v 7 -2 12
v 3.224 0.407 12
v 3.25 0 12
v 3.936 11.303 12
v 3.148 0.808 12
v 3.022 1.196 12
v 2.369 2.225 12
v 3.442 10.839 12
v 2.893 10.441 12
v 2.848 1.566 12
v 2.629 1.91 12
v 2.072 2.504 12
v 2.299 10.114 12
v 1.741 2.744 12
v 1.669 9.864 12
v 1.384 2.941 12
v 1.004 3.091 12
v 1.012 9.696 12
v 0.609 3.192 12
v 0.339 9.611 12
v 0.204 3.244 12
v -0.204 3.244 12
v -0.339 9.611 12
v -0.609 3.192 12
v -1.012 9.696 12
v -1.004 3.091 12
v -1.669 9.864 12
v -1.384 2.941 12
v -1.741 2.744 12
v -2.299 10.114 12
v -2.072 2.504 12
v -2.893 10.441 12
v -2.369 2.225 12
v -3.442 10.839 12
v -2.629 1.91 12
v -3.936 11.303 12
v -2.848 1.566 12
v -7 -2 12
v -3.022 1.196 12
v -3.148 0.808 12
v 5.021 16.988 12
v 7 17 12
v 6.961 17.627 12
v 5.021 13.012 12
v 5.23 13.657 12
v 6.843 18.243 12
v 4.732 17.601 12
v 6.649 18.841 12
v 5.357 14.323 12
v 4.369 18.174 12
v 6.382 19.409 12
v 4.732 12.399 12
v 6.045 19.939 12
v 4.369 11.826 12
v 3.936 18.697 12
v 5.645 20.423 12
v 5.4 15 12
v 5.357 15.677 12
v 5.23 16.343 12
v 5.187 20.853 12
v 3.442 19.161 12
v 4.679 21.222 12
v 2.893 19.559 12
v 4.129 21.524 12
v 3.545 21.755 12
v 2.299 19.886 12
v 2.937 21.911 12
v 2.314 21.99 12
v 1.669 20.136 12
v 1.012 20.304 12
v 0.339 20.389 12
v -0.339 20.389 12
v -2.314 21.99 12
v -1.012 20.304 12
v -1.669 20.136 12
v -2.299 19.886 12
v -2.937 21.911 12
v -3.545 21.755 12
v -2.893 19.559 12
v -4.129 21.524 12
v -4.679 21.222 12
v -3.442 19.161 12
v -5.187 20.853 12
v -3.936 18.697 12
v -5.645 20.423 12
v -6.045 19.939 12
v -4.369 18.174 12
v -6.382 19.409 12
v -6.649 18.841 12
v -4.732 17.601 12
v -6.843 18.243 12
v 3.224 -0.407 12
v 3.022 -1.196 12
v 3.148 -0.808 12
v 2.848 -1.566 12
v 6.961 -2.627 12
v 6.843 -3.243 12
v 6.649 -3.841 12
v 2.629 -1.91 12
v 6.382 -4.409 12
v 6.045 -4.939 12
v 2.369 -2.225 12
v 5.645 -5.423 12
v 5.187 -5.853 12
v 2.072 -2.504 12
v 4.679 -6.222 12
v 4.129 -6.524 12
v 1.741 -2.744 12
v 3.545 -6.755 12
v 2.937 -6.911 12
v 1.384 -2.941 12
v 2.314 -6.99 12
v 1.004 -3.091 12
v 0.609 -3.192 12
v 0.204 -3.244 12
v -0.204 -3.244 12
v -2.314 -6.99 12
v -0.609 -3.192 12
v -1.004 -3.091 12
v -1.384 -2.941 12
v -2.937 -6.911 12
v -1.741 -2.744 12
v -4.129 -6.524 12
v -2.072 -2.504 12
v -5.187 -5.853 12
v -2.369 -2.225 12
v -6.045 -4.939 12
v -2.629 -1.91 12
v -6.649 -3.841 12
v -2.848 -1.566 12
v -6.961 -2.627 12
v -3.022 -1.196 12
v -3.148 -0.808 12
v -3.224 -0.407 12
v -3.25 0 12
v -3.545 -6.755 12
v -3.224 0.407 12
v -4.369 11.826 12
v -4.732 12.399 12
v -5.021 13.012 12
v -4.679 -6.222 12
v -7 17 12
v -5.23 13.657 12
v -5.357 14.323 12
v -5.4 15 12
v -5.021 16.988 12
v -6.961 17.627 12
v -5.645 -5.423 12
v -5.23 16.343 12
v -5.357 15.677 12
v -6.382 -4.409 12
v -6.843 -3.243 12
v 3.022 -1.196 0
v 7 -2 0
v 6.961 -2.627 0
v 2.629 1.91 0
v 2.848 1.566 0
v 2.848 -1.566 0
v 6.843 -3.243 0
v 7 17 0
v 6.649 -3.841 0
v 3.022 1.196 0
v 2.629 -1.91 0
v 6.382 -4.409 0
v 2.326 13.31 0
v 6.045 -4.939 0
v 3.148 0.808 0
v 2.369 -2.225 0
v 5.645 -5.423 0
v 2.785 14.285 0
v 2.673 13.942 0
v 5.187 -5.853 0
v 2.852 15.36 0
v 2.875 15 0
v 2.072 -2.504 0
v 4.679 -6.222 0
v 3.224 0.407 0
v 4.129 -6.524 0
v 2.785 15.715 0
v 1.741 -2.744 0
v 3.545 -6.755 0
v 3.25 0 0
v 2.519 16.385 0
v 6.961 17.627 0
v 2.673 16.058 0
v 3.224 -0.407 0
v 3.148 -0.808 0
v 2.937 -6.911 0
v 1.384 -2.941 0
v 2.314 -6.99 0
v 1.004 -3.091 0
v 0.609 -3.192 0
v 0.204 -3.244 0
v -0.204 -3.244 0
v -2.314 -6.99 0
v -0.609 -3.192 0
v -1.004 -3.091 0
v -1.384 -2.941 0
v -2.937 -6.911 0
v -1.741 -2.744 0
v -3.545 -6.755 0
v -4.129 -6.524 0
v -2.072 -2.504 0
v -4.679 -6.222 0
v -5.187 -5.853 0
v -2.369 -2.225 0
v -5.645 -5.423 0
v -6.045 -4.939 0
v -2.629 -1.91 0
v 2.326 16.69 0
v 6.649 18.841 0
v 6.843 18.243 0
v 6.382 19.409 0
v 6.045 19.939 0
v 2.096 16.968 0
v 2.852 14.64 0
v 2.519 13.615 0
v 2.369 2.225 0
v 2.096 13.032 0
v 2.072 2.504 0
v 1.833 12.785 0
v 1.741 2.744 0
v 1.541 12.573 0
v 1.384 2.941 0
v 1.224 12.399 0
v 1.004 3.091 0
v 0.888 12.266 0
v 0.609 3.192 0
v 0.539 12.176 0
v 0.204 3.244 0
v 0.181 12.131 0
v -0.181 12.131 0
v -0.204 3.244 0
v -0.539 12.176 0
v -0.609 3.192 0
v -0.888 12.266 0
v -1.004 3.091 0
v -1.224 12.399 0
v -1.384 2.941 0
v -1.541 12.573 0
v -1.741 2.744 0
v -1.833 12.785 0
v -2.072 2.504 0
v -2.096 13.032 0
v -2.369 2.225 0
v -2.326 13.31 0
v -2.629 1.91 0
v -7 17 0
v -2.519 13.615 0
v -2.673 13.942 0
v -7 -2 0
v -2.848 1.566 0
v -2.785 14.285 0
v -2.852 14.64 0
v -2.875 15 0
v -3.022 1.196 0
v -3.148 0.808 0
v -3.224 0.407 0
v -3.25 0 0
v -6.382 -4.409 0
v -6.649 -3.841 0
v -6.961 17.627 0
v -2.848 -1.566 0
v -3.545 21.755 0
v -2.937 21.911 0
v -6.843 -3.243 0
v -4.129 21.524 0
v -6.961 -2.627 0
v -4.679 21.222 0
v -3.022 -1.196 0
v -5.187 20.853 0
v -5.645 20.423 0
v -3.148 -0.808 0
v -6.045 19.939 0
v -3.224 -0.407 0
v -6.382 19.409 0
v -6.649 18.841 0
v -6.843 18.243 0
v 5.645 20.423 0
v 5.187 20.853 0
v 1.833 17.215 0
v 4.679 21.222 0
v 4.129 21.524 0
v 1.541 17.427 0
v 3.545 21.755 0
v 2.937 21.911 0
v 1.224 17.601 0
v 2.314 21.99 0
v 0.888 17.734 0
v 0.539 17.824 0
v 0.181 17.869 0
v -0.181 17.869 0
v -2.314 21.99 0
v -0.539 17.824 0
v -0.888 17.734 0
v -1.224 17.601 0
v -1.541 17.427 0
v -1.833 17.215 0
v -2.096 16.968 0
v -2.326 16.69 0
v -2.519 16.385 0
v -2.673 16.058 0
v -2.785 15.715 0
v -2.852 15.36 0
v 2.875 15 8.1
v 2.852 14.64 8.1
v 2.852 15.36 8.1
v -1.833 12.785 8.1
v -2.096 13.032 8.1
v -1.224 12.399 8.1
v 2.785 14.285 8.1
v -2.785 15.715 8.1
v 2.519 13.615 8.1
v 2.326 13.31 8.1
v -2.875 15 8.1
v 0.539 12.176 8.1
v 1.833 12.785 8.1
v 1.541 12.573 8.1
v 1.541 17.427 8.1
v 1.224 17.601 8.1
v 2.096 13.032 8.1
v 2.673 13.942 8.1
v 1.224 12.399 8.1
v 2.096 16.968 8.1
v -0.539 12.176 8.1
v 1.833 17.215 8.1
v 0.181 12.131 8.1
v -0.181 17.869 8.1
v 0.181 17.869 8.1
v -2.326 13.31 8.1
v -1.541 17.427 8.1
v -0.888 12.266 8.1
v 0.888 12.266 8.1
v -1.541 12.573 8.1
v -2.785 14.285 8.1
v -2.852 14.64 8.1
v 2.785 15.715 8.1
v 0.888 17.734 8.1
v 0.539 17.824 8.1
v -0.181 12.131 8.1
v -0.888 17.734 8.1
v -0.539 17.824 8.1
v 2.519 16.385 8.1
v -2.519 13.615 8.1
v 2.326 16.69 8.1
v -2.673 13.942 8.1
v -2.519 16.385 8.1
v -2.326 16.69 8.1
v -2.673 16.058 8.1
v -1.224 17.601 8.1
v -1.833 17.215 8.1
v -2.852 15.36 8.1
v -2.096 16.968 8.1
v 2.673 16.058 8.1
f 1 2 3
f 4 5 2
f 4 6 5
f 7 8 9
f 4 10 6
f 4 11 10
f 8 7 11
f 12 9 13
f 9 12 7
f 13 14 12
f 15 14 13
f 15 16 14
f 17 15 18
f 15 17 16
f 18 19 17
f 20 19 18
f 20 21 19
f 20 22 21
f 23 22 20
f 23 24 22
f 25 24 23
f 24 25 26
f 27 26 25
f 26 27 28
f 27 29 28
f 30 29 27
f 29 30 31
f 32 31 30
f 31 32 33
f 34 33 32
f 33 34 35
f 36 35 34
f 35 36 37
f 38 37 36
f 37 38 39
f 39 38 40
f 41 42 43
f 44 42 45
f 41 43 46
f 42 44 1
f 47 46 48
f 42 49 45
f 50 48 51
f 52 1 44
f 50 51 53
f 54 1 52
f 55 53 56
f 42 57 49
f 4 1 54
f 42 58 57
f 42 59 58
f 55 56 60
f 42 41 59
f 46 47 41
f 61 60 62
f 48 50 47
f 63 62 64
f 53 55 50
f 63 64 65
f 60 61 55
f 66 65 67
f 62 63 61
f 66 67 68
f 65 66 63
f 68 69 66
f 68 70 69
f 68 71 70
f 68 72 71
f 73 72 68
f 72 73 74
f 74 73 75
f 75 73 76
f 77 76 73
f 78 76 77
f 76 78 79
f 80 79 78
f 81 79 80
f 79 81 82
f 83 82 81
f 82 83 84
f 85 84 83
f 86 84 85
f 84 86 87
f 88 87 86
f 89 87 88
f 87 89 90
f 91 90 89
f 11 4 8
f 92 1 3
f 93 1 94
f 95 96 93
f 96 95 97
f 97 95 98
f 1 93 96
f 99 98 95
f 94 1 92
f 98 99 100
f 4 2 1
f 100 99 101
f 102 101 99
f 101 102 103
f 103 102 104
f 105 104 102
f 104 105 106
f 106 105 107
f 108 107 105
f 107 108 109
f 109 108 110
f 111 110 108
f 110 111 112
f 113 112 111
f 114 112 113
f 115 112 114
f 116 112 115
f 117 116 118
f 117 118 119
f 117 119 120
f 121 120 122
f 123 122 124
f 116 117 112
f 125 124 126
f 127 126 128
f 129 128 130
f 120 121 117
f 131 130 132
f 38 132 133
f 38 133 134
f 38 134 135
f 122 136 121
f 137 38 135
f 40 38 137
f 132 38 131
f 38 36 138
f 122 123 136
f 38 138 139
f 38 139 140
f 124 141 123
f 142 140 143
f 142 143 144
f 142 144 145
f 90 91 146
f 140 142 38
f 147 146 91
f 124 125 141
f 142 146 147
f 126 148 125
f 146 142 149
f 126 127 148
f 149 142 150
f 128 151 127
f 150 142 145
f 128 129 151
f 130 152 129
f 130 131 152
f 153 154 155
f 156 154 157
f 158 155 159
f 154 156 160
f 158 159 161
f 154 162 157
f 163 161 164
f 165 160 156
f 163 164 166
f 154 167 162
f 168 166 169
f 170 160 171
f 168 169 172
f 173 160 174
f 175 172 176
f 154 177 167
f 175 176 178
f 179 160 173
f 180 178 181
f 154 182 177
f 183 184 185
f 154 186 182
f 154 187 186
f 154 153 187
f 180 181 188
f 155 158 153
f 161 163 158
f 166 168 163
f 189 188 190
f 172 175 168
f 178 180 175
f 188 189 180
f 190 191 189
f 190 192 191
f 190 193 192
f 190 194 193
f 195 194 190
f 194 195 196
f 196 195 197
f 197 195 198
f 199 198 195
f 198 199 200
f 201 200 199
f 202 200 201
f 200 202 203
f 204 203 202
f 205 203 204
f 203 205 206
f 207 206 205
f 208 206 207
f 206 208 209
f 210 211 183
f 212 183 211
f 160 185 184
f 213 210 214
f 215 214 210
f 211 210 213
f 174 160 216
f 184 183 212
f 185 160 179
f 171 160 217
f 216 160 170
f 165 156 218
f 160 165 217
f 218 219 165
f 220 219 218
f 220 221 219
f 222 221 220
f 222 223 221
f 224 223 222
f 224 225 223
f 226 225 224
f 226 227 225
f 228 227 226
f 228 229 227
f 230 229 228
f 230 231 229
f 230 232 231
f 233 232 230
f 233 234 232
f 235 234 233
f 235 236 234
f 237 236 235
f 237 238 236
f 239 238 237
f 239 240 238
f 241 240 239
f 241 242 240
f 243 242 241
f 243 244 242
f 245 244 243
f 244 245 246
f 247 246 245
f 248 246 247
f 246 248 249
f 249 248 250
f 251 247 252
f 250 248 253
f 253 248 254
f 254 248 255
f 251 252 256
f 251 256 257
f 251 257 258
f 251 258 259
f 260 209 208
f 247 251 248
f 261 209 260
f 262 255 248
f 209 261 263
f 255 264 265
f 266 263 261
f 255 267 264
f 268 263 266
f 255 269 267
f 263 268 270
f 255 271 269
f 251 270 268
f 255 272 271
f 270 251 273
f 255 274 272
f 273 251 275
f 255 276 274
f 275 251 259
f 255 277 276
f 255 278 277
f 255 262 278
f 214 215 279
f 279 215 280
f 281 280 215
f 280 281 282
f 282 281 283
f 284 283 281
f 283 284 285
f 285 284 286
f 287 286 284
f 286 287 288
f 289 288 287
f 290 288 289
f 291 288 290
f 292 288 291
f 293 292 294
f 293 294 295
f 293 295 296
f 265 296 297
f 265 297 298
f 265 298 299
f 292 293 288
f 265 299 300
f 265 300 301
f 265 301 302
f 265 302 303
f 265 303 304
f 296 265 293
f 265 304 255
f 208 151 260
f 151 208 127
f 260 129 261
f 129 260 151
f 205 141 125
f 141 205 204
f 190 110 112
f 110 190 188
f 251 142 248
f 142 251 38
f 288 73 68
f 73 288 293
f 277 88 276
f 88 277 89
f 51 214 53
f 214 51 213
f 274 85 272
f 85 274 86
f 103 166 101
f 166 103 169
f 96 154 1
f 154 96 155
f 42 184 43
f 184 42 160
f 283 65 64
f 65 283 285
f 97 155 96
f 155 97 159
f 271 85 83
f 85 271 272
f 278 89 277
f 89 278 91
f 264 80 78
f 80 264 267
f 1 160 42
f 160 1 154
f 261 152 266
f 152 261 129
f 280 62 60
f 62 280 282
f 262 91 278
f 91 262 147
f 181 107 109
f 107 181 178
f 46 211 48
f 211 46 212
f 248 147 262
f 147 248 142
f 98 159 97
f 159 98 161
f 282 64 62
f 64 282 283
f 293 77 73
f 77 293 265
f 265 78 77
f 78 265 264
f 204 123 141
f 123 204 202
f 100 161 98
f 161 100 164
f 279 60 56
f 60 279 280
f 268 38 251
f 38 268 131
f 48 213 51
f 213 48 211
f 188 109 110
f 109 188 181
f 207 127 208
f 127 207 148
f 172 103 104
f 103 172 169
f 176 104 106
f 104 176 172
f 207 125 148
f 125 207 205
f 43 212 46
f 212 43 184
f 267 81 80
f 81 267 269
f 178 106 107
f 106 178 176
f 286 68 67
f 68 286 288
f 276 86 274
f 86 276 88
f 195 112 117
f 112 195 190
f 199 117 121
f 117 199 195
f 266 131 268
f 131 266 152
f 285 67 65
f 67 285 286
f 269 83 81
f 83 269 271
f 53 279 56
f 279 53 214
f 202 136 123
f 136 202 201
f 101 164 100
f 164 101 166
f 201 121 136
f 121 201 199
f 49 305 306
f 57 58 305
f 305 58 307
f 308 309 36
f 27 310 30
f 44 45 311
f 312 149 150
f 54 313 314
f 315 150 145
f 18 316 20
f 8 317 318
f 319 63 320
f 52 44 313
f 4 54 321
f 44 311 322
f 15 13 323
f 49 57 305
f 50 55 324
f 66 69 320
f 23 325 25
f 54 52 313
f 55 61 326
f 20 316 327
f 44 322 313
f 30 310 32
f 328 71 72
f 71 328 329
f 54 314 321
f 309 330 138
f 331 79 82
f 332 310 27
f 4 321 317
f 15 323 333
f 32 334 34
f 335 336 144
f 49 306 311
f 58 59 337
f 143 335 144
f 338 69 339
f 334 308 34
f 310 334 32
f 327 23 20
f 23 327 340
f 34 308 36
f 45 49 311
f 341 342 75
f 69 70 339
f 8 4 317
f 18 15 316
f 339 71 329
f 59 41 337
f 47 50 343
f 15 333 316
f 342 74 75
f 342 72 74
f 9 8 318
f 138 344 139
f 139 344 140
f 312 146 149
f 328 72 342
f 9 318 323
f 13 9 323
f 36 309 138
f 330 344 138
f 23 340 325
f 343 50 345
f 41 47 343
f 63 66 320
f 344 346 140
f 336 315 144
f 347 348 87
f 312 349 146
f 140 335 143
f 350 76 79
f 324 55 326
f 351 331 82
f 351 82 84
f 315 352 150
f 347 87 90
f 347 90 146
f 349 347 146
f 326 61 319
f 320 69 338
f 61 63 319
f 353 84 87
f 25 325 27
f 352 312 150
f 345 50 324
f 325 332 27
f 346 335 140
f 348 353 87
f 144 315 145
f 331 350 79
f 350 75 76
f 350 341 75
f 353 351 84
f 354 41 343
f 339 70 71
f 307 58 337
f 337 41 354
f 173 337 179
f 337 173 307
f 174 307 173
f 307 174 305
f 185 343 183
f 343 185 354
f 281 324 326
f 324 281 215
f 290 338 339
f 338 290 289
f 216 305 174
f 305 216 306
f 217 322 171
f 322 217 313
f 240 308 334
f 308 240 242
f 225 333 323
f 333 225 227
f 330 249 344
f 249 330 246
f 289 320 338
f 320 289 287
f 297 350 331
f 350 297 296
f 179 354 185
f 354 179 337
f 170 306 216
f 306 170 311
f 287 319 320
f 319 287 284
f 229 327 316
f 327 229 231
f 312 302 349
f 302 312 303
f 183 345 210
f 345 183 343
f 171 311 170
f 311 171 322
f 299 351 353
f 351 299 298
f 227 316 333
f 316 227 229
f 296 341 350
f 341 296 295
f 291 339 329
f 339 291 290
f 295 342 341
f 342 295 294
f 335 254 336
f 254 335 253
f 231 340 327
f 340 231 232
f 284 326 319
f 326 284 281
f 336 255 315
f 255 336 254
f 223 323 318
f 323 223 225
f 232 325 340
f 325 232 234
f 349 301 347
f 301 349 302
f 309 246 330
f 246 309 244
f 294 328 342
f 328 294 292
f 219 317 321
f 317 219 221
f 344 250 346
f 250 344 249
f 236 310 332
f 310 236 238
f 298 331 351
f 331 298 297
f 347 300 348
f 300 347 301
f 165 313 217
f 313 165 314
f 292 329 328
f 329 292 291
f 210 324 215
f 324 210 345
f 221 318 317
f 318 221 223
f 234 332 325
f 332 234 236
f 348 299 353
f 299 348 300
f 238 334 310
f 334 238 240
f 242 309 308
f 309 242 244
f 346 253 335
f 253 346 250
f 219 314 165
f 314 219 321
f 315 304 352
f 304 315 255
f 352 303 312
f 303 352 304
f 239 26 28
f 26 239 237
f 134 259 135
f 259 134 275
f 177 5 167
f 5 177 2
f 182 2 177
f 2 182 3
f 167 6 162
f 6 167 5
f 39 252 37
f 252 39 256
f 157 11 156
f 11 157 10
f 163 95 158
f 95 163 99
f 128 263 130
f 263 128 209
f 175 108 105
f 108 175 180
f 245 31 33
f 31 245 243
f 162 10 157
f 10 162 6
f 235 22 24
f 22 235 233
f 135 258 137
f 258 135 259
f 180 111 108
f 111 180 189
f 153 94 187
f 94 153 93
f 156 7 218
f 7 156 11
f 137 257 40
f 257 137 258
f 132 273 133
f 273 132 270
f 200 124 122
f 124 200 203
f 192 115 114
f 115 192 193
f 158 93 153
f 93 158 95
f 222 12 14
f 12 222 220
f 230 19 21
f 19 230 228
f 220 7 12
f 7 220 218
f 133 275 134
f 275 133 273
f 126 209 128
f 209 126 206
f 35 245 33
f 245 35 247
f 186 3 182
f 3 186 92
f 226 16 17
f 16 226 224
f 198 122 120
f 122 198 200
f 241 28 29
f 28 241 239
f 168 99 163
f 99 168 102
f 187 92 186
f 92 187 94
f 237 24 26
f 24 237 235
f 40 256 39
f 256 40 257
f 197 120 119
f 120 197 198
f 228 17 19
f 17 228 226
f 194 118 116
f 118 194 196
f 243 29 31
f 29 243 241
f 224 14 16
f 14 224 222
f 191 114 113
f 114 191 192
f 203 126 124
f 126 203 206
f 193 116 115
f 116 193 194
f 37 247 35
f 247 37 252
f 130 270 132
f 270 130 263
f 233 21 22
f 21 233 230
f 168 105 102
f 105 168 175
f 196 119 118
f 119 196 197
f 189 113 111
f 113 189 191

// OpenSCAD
$fn = 50;


difference() {
	union() {
		cylinder(h = 12, r = 7.0000000000);
		translate(v = [0.0000000000, 7.5000000000, 0]) {
			hull() {
				translate(v = [-2.0000000000, 9.5000000000, 0]) {
					cylinder(h = 12, r = 5);
				}
				translate(v = [2.0000000000, 9.5000000000, 0]) {
					cylinder(h = 12, r = 5);
				}
				translate(v = [-2.0000000000, -9.5000000000, 0]) {
					cylinder(h = 12, r = 5);
				}
				translate(v = [2.0000000000, -9.5000000000, 0]) {
					cylinder(h = 12, r = 5);
				}
			}
		}
		translate(v = [0.0000000000, 7.5000000000, 0]) {
			hull() {
				translate(v = [-2.0000000000, 9.5000000000, 0]) {
					cylinder(h = 12, r = 5);
				}
				translate(v = [2.0000000000, 9.5000000000, 0]) {
					cylinder(h = 12, r = 5);
				}
				translate(v = [-2.0000000000, -9.5000000000, 0]) {
					cylinder(h = 12, r = 5);
				}
				translate(v = [2.0000000000, -9.5000000000, 0]) {
					cylinder(h = 12, r = 5);
				}
			}
		}
	}
	union() {
		translate(v = [0.0000000000, 15.0000000000, 12]) {
			rotate(a = [0, 0, 0]) {
				difference() {
					union() {
						#translate(v = [0, 0, -12.0000000000]) {
							cylinder(h = 12, r = 2.6000000000);
						}
						#translate(v = [0, 0, -3.9000000000]) {
							cylinder(h = 3.9000000000, r1 = 2.8750000000, r2 = 5.4000000000);
						}
						#translate(v = [0, 0, -12.0000000000]) {
							cylinder(h = 12, r = 2.8750000000);
						}
						#translate(v = [0, 0, -12.0000000000]) {
							cylinder(h = 12, r = 2.6000000000);
						}
					}
					union();
				}
			}
		}
		translate(v = [0.0000000000, 15.0000000000, 12]) {
			rotate(a = [0, 0, 0]) {
				difference() {
					union() {
						#translate(v = [0, 0, -12.0000000000]) {
							cylinder(h = 12, r = 2.6000000000);
						}
						#translate(v = [0, 0, -3.9000000000]) {
							cylinder(h = 3.9000000000, r1 = 2.8750000000, r2 = 5.4000000000);
						}
						#translate(v = [0, 0, -12.0000000000]) {
							cylinder(h = 12, r = 2.8750000000);
						}
						#translate(v = [0, 0, -12.0000000000]) {
							cylinder(h = 12, r = 2.6000000000);
						}
					}
					union();
				}
			}
		}
		translate(v = [0, 0, -100]) {
			cylinder(h = 200, r = 3.2500000000);
		}
		translate(v = [0, 0, -100]) {
			cylinder(h = 200, r = 1.8000000000);
		}
	}
}
